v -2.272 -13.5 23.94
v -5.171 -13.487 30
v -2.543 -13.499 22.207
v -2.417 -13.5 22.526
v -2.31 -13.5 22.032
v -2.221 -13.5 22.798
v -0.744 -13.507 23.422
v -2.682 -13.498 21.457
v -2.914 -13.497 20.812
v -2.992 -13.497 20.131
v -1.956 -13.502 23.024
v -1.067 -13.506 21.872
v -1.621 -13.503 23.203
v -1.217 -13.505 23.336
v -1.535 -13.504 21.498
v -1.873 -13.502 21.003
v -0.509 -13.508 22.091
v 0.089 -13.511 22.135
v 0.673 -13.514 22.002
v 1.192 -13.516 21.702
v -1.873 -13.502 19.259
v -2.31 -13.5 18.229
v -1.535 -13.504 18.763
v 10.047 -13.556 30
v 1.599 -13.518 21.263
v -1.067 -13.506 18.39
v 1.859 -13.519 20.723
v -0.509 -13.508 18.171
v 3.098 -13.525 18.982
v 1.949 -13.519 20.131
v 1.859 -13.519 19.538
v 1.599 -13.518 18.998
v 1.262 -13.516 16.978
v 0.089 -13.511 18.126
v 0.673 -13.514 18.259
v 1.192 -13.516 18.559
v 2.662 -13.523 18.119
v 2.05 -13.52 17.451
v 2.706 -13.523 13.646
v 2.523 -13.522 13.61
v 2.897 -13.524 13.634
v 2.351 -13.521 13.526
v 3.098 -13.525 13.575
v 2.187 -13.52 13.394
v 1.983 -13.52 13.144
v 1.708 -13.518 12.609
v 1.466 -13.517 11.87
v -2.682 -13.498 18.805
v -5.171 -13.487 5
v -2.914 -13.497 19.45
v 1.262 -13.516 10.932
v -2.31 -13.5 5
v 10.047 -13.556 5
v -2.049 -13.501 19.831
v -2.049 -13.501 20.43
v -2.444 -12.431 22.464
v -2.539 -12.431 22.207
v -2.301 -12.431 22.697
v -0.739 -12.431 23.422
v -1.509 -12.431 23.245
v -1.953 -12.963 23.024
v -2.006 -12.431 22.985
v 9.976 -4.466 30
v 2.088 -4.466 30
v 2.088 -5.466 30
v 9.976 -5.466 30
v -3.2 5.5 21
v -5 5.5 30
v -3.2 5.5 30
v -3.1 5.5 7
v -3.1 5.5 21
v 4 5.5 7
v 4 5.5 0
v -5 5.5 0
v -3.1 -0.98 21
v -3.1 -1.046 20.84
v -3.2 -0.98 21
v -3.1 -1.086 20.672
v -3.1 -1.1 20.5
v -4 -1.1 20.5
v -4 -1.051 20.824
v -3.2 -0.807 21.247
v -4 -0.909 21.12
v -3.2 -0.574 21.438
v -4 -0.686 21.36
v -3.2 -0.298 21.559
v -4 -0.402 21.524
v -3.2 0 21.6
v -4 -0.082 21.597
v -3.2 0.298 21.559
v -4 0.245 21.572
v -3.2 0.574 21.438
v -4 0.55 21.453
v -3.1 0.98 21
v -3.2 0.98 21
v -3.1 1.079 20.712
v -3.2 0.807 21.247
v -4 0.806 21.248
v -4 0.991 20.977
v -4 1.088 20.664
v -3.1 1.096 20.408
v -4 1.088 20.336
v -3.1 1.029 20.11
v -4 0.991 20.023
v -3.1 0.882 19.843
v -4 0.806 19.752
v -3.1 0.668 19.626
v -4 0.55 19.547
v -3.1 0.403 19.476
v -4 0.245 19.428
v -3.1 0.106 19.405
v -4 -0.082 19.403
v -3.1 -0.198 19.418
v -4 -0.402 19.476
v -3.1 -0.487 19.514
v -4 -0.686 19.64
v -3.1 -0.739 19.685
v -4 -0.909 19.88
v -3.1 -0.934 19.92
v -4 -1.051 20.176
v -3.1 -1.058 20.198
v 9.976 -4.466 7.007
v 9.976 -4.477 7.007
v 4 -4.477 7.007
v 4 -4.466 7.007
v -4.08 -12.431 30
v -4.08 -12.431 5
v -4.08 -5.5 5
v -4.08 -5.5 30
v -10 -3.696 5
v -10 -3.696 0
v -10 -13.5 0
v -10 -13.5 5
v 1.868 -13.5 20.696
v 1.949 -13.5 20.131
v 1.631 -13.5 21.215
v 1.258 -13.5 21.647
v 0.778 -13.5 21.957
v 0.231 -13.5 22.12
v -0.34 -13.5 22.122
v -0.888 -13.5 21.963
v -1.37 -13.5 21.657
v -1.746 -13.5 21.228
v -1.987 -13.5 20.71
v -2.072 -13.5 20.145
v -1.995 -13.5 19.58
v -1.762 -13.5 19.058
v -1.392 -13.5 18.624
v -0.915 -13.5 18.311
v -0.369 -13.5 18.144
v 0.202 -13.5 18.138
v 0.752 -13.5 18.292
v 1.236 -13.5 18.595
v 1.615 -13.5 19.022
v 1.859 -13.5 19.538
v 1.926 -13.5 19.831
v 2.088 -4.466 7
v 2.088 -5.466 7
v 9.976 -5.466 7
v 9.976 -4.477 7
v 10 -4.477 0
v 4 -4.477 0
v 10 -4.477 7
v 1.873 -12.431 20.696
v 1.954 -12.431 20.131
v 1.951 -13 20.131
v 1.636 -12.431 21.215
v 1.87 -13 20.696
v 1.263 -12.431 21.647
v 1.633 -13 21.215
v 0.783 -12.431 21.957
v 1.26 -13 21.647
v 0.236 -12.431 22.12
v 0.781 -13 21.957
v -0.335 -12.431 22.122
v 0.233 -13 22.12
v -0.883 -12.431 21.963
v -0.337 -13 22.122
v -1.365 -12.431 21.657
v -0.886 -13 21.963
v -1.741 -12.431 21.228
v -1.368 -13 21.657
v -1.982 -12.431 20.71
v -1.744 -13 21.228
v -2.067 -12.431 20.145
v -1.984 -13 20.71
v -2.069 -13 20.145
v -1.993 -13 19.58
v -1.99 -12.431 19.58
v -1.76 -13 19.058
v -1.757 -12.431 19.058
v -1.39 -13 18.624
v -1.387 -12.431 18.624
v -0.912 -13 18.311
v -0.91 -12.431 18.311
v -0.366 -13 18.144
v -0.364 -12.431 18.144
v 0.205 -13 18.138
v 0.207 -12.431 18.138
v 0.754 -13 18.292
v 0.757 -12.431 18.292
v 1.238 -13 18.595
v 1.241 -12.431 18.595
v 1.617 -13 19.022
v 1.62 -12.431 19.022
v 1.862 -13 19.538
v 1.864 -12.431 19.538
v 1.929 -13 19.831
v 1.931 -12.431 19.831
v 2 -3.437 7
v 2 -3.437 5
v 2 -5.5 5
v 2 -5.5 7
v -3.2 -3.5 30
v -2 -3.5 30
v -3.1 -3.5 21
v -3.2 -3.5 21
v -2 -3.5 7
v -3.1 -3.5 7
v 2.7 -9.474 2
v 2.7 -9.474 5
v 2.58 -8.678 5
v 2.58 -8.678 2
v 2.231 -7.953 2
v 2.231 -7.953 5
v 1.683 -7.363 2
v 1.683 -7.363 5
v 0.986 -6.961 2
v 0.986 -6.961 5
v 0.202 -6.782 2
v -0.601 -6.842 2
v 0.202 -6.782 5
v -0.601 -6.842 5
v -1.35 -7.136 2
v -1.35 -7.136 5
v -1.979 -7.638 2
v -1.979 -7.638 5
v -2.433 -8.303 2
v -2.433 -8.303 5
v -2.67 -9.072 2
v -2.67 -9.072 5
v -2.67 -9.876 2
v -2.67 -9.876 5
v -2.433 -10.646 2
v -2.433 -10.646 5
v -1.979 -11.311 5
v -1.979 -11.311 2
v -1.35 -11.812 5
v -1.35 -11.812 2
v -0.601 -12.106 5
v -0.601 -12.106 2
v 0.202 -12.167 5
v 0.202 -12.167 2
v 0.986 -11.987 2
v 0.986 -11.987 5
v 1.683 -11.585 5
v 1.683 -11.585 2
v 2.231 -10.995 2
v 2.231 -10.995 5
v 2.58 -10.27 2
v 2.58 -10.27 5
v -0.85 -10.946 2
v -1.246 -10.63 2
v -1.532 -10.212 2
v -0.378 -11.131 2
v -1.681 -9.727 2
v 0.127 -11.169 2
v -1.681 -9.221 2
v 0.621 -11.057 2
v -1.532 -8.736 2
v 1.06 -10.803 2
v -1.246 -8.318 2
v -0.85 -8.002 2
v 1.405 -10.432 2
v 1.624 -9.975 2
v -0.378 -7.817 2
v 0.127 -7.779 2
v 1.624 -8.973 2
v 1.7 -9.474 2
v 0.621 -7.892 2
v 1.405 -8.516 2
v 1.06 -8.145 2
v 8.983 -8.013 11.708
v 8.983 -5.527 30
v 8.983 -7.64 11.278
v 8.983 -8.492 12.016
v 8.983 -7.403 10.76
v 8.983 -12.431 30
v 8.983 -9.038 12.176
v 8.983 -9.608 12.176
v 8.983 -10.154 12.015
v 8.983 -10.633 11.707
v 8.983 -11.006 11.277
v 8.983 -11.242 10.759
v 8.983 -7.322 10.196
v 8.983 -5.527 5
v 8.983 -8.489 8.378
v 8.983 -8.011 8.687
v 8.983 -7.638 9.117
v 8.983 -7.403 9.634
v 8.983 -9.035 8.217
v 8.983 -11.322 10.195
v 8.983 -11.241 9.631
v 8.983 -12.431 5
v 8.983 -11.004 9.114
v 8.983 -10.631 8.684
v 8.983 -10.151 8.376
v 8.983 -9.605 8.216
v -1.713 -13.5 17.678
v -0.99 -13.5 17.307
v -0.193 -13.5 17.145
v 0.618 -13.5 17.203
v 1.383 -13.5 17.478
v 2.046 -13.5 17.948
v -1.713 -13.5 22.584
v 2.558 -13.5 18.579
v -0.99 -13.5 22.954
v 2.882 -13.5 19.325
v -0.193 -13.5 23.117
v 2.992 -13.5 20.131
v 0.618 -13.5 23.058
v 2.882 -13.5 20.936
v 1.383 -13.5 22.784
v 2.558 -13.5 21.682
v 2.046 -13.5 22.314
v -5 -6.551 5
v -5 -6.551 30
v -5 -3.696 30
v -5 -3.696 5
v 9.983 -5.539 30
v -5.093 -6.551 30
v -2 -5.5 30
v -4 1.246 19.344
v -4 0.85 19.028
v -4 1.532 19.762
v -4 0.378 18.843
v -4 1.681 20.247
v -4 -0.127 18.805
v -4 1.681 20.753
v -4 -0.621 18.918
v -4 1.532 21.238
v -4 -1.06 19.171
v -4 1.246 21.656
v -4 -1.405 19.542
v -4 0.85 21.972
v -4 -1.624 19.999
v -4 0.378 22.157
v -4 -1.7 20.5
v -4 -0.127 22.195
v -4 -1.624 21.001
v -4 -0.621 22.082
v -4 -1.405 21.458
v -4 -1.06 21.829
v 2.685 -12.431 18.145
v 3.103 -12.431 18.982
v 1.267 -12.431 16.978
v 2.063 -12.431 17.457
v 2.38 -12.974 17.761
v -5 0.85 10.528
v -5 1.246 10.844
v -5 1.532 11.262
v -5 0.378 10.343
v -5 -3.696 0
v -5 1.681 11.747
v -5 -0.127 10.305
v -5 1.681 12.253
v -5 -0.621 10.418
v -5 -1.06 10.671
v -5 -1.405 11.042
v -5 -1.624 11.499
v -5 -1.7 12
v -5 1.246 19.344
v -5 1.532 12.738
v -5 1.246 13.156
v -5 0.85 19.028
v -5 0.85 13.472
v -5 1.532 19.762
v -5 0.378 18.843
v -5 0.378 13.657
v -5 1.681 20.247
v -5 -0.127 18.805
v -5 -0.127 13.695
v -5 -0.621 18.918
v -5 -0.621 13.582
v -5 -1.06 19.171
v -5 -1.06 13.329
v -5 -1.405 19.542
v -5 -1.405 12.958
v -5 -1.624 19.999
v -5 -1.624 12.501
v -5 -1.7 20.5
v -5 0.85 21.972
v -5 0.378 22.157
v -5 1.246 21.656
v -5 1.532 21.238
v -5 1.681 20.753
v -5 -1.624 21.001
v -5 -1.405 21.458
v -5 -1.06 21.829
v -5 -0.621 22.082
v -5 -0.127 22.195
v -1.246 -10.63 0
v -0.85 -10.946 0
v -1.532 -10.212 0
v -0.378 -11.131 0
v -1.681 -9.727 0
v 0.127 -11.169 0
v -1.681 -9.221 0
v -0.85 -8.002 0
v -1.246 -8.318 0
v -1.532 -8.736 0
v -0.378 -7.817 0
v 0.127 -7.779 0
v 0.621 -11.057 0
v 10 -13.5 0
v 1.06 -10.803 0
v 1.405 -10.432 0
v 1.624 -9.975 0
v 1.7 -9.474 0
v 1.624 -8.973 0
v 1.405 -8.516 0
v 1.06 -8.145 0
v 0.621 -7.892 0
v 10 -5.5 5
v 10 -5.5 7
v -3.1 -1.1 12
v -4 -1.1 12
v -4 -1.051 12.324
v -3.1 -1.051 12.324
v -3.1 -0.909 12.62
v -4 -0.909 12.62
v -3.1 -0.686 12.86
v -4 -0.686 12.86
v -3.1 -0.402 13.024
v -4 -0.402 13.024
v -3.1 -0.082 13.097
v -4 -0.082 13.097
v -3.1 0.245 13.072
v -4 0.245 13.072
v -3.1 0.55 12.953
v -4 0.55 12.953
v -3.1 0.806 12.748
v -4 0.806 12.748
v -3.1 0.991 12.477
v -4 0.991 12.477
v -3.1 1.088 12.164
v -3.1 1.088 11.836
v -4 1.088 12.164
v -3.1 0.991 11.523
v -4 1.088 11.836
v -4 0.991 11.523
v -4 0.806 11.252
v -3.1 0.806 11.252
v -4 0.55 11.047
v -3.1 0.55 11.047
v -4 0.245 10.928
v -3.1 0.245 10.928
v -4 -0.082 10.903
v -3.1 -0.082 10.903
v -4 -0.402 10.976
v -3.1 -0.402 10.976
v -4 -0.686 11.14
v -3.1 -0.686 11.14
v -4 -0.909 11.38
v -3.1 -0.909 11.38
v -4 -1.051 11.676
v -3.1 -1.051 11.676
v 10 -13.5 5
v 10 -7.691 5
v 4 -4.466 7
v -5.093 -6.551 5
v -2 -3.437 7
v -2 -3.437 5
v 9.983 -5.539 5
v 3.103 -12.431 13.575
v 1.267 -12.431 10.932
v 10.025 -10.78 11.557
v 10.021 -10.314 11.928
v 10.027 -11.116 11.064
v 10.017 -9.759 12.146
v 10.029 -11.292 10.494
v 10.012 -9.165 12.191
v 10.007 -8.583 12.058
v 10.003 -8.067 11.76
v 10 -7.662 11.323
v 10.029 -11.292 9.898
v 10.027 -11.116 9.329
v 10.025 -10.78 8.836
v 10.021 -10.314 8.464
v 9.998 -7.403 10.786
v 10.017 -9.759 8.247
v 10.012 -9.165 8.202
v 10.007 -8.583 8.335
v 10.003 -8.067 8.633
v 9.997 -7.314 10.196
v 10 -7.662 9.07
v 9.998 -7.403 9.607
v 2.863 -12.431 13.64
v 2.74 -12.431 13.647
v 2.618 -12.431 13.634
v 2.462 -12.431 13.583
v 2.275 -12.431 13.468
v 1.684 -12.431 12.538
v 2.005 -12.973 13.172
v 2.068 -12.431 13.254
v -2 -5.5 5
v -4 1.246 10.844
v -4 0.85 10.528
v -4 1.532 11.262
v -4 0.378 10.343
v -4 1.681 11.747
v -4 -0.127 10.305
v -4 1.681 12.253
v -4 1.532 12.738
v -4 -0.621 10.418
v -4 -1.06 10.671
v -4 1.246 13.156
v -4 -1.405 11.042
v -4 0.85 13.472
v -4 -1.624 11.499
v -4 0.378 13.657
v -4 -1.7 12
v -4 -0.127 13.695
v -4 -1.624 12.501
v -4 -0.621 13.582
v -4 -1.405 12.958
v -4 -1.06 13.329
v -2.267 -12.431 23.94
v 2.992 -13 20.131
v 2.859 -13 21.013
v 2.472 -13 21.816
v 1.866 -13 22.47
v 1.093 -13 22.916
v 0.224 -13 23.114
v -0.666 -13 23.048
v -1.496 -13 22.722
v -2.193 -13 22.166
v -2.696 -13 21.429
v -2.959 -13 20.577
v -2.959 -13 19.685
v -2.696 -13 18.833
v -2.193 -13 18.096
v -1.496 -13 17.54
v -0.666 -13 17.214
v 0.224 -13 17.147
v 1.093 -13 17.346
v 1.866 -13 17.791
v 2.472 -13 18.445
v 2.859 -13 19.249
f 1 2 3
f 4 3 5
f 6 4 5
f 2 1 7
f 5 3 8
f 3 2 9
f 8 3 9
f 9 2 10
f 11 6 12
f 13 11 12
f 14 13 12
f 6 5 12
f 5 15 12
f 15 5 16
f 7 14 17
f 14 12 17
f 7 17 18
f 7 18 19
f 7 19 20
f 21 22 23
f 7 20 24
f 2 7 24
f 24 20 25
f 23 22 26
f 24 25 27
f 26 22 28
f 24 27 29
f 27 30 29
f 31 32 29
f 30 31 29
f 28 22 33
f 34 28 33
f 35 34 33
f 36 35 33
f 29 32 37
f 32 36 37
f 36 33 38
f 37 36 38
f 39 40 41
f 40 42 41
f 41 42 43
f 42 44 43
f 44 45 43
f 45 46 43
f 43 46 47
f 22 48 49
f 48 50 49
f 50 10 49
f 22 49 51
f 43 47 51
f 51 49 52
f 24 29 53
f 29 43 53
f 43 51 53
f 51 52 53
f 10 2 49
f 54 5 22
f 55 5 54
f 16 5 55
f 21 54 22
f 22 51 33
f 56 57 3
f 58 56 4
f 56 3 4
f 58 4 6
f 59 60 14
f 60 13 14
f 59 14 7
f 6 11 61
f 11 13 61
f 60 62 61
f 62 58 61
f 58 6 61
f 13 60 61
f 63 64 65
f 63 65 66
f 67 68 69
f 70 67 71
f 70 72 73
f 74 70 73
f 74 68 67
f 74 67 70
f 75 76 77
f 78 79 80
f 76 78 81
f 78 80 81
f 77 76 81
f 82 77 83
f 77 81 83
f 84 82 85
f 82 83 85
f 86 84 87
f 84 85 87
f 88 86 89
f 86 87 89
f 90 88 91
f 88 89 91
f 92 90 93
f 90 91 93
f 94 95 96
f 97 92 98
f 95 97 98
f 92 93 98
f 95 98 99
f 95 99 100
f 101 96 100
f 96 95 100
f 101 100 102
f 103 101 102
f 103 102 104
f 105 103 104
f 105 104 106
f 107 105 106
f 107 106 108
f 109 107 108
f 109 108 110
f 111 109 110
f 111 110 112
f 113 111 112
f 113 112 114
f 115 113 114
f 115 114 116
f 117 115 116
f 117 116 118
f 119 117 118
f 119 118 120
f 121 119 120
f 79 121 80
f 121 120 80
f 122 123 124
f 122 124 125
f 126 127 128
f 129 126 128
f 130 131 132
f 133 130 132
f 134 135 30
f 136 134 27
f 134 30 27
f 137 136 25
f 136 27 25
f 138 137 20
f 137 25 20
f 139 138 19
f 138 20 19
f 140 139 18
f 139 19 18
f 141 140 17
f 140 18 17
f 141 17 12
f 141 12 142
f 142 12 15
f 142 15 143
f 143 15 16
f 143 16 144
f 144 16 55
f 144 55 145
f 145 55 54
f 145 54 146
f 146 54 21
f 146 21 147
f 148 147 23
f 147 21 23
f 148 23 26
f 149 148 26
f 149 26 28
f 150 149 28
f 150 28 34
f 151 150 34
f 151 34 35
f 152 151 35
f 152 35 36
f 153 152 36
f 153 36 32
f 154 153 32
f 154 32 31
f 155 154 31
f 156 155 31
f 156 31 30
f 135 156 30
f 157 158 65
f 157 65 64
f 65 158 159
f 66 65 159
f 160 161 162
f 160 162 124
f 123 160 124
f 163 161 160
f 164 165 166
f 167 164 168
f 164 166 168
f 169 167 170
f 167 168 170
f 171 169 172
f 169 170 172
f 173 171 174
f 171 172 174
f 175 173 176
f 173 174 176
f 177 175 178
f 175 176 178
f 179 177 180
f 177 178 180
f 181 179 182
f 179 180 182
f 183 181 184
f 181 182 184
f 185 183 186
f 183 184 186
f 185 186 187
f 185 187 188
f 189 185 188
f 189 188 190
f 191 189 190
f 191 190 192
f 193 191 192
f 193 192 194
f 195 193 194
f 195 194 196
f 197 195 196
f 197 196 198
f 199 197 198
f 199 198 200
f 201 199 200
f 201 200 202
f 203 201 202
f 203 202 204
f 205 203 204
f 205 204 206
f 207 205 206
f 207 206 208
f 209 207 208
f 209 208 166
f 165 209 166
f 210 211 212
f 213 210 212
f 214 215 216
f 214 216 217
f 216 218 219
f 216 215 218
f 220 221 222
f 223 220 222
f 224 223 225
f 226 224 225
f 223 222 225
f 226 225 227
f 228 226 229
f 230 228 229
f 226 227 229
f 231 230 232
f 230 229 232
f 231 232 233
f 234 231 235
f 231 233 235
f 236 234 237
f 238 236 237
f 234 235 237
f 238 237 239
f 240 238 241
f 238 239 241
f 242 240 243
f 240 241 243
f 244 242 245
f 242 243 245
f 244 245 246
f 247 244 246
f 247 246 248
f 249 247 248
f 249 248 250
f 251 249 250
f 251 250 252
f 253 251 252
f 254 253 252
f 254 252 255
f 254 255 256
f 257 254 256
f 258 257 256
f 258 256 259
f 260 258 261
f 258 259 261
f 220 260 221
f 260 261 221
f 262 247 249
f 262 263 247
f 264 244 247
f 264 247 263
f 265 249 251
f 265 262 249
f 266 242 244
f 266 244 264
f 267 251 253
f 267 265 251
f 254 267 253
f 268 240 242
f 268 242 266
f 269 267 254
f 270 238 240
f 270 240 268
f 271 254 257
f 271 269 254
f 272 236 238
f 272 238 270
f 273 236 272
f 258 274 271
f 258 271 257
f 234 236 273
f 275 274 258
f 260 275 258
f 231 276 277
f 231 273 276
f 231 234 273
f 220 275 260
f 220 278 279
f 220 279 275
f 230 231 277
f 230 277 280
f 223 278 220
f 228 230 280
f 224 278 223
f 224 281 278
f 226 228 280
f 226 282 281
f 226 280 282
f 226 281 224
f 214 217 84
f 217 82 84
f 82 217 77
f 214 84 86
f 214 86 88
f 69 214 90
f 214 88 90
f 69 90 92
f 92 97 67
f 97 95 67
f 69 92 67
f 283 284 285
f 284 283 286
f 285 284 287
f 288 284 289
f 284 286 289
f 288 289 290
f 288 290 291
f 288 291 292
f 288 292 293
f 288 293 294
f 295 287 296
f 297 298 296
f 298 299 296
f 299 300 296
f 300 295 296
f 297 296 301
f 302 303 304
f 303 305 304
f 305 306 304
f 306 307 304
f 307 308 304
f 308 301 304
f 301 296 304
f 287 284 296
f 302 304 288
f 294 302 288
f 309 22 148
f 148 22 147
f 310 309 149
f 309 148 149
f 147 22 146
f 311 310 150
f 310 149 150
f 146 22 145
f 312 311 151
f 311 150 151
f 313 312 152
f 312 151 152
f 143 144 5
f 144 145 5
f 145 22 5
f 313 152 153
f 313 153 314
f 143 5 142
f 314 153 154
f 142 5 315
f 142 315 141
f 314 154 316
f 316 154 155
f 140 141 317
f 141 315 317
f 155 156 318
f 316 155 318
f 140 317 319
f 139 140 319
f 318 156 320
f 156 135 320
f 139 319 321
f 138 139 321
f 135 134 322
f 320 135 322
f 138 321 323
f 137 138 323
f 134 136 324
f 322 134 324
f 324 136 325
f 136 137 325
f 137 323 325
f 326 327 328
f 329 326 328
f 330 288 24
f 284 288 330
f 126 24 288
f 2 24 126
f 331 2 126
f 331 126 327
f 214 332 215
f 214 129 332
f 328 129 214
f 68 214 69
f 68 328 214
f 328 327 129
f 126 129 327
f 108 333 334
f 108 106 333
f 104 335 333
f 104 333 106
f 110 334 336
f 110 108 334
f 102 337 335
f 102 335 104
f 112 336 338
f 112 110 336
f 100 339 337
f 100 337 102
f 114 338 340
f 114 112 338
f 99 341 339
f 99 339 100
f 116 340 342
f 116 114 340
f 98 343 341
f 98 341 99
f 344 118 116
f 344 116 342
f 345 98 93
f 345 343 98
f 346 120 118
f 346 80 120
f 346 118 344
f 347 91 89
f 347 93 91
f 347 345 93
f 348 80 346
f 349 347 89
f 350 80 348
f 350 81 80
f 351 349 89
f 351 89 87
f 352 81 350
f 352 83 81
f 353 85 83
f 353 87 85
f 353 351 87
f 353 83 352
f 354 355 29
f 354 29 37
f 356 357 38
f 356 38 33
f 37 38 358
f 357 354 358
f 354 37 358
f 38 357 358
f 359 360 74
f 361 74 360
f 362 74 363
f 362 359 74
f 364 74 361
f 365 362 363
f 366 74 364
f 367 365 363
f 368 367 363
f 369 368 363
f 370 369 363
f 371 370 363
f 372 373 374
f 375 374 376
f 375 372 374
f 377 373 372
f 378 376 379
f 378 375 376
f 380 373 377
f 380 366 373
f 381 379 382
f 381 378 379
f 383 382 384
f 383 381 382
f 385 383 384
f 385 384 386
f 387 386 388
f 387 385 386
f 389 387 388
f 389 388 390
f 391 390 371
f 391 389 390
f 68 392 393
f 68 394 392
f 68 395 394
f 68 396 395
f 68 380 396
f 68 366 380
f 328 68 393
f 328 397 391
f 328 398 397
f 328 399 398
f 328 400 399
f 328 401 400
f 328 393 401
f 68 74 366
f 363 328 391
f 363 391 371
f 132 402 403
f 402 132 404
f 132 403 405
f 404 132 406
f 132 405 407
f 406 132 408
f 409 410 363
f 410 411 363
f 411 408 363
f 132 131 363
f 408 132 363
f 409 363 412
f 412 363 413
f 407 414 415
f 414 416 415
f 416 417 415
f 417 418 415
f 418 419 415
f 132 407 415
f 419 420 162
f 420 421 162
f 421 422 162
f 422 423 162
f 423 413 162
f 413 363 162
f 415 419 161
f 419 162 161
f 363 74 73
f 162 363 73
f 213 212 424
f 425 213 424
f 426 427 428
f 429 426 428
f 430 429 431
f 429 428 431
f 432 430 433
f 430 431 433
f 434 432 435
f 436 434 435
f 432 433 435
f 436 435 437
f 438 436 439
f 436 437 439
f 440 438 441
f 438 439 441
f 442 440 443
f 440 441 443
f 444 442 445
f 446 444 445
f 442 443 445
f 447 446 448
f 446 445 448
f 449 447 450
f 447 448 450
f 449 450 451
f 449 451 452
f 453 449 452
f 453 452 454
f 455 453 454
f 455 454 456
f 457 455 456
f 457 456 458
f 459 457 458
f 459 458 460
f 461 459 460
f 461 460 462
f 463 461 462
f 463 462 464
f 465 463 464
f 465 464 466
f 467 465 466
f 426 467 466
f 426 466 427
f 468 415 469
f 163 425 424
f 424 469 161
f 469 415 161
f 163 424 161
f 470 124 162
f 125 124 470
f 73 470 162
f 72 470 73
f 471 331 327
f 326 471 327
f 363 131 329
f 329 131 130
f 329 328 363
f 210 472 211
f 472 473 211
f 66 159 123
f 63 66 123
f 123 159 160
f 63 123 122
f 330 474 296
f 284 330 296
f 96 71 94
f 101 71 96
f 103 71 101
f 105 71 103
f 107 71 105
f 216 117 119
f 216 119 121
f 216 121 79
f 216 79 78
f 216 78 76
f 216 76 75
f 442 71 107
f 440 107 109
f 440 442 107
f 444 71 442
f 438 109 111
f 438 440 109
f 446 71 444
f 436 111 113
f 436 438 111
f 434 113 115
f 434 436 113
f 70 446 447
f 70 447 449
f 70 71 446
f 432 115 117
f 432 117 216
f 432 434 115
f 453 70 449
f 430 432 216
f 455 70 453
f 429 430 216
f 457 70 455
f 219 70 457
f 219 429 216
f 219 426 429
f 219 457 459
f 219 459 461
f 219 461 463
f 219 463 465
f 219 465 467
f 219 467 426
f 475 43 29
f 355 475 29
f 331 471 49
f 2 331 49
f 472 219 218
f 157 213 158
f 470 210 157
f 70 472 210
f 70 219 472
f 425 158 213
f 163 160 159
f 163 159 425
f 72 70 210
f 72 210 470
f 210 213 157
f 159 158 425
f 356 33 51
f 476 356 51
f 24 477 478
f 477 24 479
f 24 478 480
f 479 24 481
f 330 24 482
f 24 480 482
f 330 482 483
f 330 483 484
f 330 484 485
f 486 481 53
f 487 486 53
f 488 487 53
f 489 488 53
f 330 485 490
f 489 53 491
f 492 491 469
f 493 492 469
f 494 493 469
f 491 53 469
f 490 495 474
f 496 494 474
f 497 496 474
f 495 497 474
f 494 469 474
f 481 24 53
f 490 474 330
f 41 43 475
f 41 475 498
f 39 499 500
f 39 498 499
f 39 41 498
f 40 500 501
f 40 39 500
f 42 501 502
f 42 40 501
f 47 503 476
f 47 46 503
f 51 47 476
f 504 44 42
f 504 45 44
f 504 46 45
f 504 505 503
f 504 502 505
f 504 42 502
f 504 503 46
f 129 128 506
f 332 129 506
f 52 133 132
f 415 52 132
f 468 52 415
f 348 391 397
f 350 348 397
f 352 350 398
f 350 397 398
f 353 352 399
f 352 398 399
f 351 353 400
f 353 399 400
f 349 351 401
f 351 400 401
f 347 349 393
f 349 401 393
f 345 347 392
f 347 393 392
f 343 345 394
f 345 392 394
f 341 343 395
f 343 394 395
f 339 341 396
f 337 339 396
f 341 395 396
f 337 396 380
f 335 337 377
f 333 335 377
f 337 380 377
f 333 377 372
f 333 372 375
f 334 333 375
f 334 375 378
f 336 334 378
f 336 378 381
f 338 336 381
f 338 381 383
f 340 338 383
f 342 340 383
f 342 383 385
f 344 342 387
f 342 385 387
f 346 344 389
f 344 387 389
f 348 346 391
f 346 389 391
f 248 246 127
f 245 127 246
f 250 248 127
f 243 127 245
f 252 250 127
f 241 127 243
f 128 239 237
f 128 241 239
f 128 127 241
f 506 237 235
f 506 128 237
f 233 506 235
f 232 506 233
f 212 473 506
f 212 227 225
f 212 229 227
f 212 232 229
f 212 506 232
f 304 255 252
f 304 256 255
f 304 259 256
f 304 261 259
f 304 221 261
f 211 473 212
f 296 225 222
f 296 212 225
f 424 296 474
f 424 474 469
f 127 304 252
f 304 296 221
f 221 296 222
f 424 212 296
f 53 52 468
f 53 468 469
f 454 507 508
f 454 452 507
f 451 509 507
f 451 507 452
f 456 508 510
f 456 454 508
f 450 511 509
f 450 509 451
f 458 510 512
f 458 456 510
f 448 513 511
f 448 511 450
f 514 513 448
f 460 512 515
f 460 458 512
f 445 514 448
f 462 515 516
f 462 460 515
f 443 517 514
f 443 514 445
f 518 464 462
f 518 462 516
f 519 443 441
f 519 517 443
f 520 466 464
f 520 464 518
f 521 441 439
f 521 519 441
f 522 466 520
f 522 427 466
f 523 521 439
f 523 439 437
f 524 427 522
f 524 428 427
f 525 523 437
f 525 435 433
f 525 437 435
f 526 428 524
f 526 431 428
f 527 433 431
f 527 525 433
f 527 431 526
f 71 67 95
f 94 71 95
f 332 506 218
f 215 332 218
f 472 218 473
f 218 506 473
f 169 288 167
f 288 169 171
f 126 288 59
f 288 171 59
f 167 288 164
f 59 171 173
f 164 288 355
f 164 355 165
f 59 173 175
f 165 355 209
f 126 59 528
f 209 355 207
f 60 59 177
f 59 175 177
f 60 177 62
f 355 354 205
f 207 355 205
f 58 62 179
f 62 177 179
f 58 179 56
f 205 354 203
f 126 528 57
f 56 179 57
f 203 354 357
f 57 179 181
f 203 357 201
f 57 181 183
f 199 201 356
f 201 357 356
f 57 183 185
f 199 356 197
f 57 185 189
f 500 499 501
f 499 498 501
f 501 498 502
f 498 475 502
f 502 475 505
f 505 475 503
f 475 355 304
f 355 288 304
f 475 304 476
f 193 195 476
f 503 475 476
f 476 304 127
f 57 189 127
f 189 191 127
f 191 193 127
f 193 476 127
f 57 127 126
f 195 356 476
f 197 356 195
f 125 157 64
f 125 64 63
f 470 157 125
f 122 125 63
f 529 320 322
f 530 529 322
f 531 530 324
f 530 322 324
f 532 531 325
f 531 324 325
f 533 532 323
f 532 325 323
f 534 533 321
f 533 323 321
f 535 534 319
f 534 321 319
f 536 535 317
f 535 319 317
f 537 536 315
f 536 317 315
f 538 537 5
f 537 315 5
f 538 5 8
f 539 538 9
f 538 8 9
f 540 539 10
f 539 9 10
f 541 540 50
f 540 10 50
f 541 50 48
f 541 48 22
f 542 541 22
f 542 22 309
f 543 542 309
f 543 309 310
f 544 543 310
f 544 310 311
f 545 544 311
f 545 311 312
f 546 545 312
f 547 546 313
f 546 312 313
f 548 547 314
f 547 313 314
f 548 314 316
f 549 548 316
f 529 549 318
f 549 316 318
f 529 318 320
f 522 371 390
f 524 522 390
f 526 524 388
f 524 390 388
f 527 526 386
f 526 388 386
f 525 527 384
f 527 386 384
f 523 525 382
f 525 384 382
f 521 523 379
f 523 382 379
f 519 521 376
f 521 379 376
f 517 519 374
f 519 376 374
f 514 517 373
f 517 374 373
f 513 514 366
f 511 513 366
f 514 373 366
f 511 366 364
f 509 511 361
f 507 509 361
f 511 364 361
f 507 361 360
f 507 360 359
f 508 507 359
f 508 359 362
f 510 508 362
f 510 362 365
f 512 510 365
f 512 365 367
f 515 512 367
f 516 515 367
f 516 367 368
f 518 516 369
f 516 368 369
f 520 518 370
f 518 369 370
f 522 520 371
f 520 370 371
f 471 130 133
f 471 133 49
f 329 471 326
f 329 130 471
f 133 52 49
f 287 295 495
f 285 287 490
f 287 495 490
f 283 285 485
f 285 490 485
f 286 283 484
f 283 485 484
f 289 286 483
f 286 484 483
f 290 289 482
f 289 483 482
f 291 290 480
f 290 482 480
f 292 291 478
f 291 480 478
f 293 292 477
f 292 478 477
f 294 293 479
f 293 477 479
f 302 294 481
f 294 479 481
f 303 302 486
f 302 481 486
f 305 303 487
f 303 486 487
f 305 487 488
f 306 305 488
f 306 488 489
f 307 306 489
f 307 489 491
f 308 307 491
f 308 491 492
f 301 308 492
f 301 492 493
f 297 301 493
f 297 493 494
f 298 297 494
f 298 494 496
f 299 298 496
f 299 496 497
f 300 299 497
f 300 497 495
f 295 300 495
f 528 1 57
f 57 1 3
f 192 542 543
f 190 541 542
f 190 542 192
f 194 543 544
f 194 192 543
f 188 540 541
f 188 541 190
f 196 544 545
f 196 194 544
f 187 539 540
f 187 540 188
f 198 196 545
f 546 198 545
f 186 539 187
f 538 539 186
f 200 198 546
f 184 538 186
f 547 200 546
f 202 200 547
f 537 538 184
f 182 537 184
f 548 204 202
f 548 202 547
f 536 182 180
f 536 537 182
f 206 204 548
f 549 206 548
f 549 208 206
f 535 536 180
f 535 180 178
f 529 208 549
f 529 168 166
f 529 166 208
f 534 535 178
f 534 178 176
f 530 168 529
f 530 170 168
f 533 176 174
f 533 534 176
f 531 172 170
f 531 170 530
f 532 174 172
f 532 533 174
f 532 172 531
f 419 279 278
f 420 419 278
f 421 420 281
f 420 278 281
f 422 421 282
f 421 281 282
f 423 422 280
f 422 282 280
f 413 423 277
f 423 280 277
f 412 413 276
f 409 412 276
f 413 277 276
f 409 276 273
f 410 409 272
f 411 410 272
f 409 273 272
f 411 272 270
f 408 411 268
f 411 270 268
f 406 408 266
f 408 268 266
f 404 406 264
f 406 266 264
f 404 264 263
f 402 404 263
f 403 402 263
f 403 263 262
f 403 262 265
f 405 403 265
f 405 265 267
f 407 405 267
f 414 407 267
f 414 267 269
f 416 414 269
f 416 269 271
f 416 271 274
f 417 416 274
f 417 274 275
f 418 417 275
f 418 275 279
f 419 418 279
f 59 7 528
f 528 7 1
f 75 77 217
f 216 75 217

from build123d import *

# Parameters (mm, degrees)
SKETCH_W           = 20
SKETCH_H           = 11
PAD_DEPTH          = 21
SKETCH001_W        = 20
SKETCH001_H        = 5
PAD001_DEPTH       = 8
SKETCH002_W        = 6.4
SKETCH002_H        = 9.70104
POCKET_DEPTH       = 16
SKETCH003_W        = 4
SKETCH003_H        = 2.091244
POCKET001_DEPTH    = 16
SKETCH005_R        = 2.7
POCKET002_DEPTH    = 3
SKETCH006_R        = 1.7
POCKET003_DEPTH    = 15
PAD002_DEPTH       = 1
PAD003_DEPTH       = 1
PAD004_DEPTH       = 8
PAD005_DEPTH       = 8
PAD006_DEPTH       = 1
PAD007_DEPTH       = 1
PAD007_FACE27_W    = 9
PAD007_FACE27_H    = 14
PAD008_DEPTH       = 0.1
PAD008_FACE24_W    = 9
PAD008_FACE24_H    = 14
PAD009_DEPTH       = 0.1
SKETCH009_W        = 11.765216
SKETCH009_H        = 12.105414
POCKET007_DEPTH    = 23
SKETCH010_W        = 8
SKETCH010_H        = 5
PAD010_DEPTH       = 6
PAD011_DEPTH       = 25
SKETCH012_W        = 7.888134
SKETCH012_H        = 1
PAD012_DEPTH       = 23
SKETCH014_R        = 2
POCKET008_DEPTH    = 5
SKETCH016_W        = 9.43169
SKETCH016_H        = 30.019524
POCKET010_DEPTH    = 5
SKETCH019_W        = 10.102889
SKETCH019_H        = 7.195522
POCKET012_DEPTH    = 6
SKETCH020_R        = 4.8264255923
POCKET014_DEPTH    = 0.5
POCKET015_DEPTH    = 2
COPYSKETCH024_R    = 1.1
POCKET017_DEPTH    = 3
SKETCH025_R        = 1.7
POCKET018_DEPTH    = 1
SKETCH026_R        = 2.010288662
POCKET019_DEPTH    = 5
COPYSKETCH027_R    = 2.99206
POCKET020_DEPTH    = 0.5
COPYSKETCH027001_W = 6.010766
COPYSKETCH027001_H = 4.360142
POCKET021_DEPTH    = 25


with BuildPart() as part:
    # Sketch → Pad (new body)
    with BuildSketch(Plane.XY):
        Rectangle(SKETCH_W, SKETCH_H)
    extrude(amount=PAD_DEPTH)

    # Sketch001 (on Face1 of Pad) → Pad001 (join)
    with BuildSketch(Plane.XZ.offset(5.5)):
        with Locations((0, 2.5)):
            Rectangle(SKETCH001_W, SKETCH001_H)
    extrude(amount=PAD001_DEPTH)

    # Sketch002 (on Face4 of Pad001) → Pocket (cut)
    with BuildSketch(Plane.XY.offset(21)):
        with Locations((0, 1.35052)):
            Rectangle(SKETCH002_W, SKETCH002_H)
    extrude(amount=-POCKET_DEPTH, mode=Mode.SUBTRACT)

    # Sketch003 (on Face4 of Pocket) → Pocket001 (cut)
    with BuildSketch(Plane.XY.offset(21)):
        with Locations((0, -4.482633)):
            Rectangle(SKETCH003_W, SKETCH003_H)
    extrude(amount=-POCKET001_DEPTH, mode=Mode.SUBTRACT)

    # Sketch005 (on Face5 of Pocket001) → Pocket002 (cut)
    with BuildSketch(Plane.XY.offset(5)):
        with Locations((0, -9.4740693718)):
            Circle(SKETCH005_R)
    extrude(amount=-POCKET002_DEPTH, mode=Mode.SUBTRACT)

    # Sketch006 (on Face24 of Pocket002) → Pocket003 (cut)
    with BuildSketch(Plane.XY.offset(2)):
        with Locations((0, -9.4740693718)):
            Circle(SKETCH006_R)
    extrude(amount=-POCKET003_DEPTH, mode=Mode.SUBTRACT)

    # Pocket003 Face21 → Pad002 (add)
    with BuildSketch(Plane(origin=(0, 1.0196321739, 5), x_dir=(0, 1, 0), z_dir=(0, 0, 1))):
        Polygon((4.4803678261, -3.2), (4.4803678261, 3.2), (-4.5196321739, 3.2), (-4.5196321739, 2), (-4.4566431739, 2), (-4.4566431739, -2), (-4.5196321739, -2), (-4.5196321739, -3.2), align=None)
    extrude(amount=PAD002_DEPTH)

    # Pad002 Face3 → Pad003 (add)
    with BuildSketch(Plane(origin=(6.4756476684, -0.1398963731, 21), x_dir=(0, 1, 0), z_dir=(0, 0, 1))):
        Polygon((-3.3601036269, 4.4756476684), (-5.3601036269, 4.4756476684), (-5.3601036269, -3.5243523316), (5.6398963731, -3.5243523316), (5.6398963731, 3.2756476684), (-3.3601036269, 3.2756476684), align=None)
    extrude(amount=PAD003_DEPTH)

    # Pad003 Face22 → Pad004 (add)
    with BuildSketch(Plane(origin=(-6.4756476684, -0.1398963731, 21), x_dir=(0, 1, 0), z_dir=(0, 0, 1))):
        Polygon((5.6398963731, -3.2756476684), (5.6398963731, 3.5243523316), (-5.3601036269, 3.5243523316), (-5.3601036269, -4.4756476684), (-3.3601036269, -4.4756476684), (-3.3601036269, -3.2756476684), align=None)
    extrude(amount=PAD004_DEPTH)

    # Pad004 Face11 → Pad005 (add)
    with BuildSketch(Plane(origin=(6.4756476684, -0.1398963731, 22), x_dir=(0, 1, 0), z_dir=(0, 0, 1))):
        Polygon((-3.3601036269, 4.4756476684), (-5.3601036269, 4.4756476684), (-5.3601036269, -3.5243523316), (5.6398963731, -3.5243523316), (5.6398963731, 3.2756476684), (-3.3601036269, 3.2756476684), align=None)
    extrude(amount=PAD005_DEPTH)

    # Pad005 Face40 → Pad006 (add)
    with BuildSketch(Plane(origin=(-6.4756476684, -0.1398963731, 29), x_dir=(0, 1, 0), z_dir=(0, 0, 1))):
        Polygon((5.6398963731, -3.2756476684), (5.6398963731, 3.5243523316), (-5.3601036269, 3.5243523316), (-5.3601036269, -4.4756476684), (-3.3601036269, -4.4756476684), (-3.3601036269, -3.2756476684), align=None)
    extrude(amount=PAD006_DEPTH)

    # Pad006 Face33 → Pad007 (add)
    with BuildSketch(Plane(origin=(0, 1.0196321739, 6), x_dir=(0, 1, 0), z_dir=(0, 0, 1))):
        Polygon((4.4803678261, -3.2), (4.4803678261, 3.2), (-4.5196321739, 3.2), (-4.5196321739, 2), (-4.4566431739, 2), (-4.4566431739, -2), (-4.5196321739, -2), (-4.5196321739, -3.2), align=None)
    extrude(amount=PAD007_DEPTH)

    # Pad007 Face27 → Pad008 (add)
    with BuildSketch(Plane(origin=(3.2, 1, 14), x_dir=(0, 1, 0), z_dir=(-1, 0, 0))):
        Rectangle(PAD007_FACE27_W, PAD007_FACE27_H)
    extrude(amount=PAD008_DEPTH)

    # Pad008 Face24 → Pad009 (add)
    with BuildSketch(Plane(origin=(-3.2, 1, 14), x_dir=(0, -1, 0), z_dir=(1, 0, 0))):
        Rectangle(PAD008_FACE24_W, PAD008_FACE24_H)
    extrude(amount=PAD009_DEPTH)

    # Sketch009 → Pocket007 (cut)
    with BuildSketch(Plane.XY.offset(30)):
        with Locations((7.044694, 0.235483)):
            Rectangle(SKETCH009_W, SKETCH009_H)
    extrude(amount=-POCKET007_DEPTH, mode=Mode.SUBTRACT)

    # Sketch010 → Pad010 (join)
    with BuildSketch(Plane(origin=(-4, 0, 0), x_dir=(0, -1, 0), z_dir=(-1, 0, 0))):
        with Locations((9.5, 2.5)):
            Rectangle(SKETCH010_W, SKETCH010_H)
    extrude(amount=PAD010_DEPTH)

    # Sketch011 (on Face16 of Pad010) → Pad011 (join)
    with BuildSketch(Plane.XY.offset(5)):
        Polygon((-5.0802496781, -5.4306888829), (-5.170571, -13.486972), (10.046902, -13.556283), (9.9827916781, -5.539257), (8.9827916781, -5.527363), (8.9827916781, -12.430687), (-4.0802496781, -12.430687), (-4.0802496781, -5.4306871171), align=None)
    extrude(amount=PAD011_DEPTH)

    # Sketch012 (on Face3 of Pad011) → Pad012 (join)
    with BuildSketch(Plane.XY.offset(7)):
        with Locations((6.031892, -4.9664883219)):
            Rectangle(SKETCH012_W, SKETCH012_H)
    extrude(amount=PAD012_DEPTH)

    # Sketch014 (on Face24 of Pad012) → Pocket008 (cut)
    with BuildSketch(Plane(origin=(9.9378599981, 0.0794707917, 0), x_dir=(-0.0079965154, 0.9999680274, 0), z_dir=(0.9999680274, 0.0079965154, 0))):
        with Locations((-9.393911, 10.196385)):
            Circle(SKETCH014_R)
    extrude(amount=-POCKET008_DEPTH, mode=Mode.SUBTRACT)

    # Sketch016 → Pocket010 (cut)
    with BuildSketch(Plane(origin=(-10, 0, 0), x_dir=(0, -1, 0), z_dir=(-1, 0, 0))):
        with Locations((-1.020089, 15.009762)):
            Rectangle(SKETCH016_W, SKETCH016_H)
    extrude(amount=-POCKET010_DEPTH, mode=Mode.SUBTRACT)

    # Sketch019 → Pocket012 (cut)
    with BuildSketch(Plane.YZ.offset(10)):
        with Locations((0.5744515, 3.409147)):
            Rectangle(SKETCH019_W, SKETCH019_H)
    extrude(amount=-POCKET012_DEPTH, mode=Mode.SUBTRACT)

    # Sketch020 → Pocket014 (cut)
    with BuildSketch(Plane.XY.offset(2)):
        with Locations((-0.021918, 17.928259)):
            Circle(SKETCH020_R)
    extrude(amount=-POCKET014_DEPTH, mode=Mode.SUBTRACT)

    # Sketch022 (on Face189 of Pocket014) → Pocket015 (cut)
    with BuildSketch(Plane.XY.offset(2)):
        with BuildLine():
            add(Edge.make_bspline(
                [(-1.975646, 22.546564), (-3.685938, 22.005808), (-4.331799, 20.570465)],
                knots=[0, 0, 0, 1, 1, 1], degree=2))
            Line((-4.331799, 20.570465), (-4.136705, 22.627766))
            Line((-4.136705, 22.627766), (-1.975646, 22.546564))
        make_face()
    extrude(amount=-POCKET015_DEPTH, mode=Mode.SUBTRACT)

    # CopySketch024 → Pocket017 (cut)
    with BuildSketch(Plane(origin=(-5, 0, 0), x_dir=(0, -1, 0), z_dir=(-1, 0, 0))):
        with Locations((0, 12)):
            Circle(COPYSKETCH024_R)
        with Locations((0, 20.5)):
            Circle(COPYSKETCH024_R)
    extrude(amount=-POCKET017_DEPTH, mode=Mode.SUBTRACT)

    # Sketch025 (on Face29 of Pocket017) → Pocket018 (cut)
    with BuildSketch(Plane(origin=(-5, 0, 0), x_dir=(0, -1, 0), z_dir=(-1, 0, 0))):
        with Locations((0, 20.5)):
            Circle(SKETCH025_R)
        with Locations((0, 12)):
            Circle(SKETCH025_R)
    extrude(amount=-POCKET018_DEPTH, mode=Mode.SUBTRACT)

    # Sketch026 (on Face48 of Pocket018) → Pocket019 (cut)
    with BuildSketch(Plane(origin=(-0.0615350782, -13.5102421178, 0), x_dir=(0.9999896275, -0.0045546512, 0), z_dir=(-0.0045546512, -0.9999896275, 0))):
        with Locations((0, 20.130779)):
            Circle(SKETCH026_R)
        with BuildLine():
            add(Edge.make_bspline(
                [(3.15934, 18.981977), (2.637434, 17.541506), (1.323444, 16.977846)],
                knots=[0, 0, 0, 1, 1, 1], degree=2))
            Line((1.323444, 16.977846), (1.323444, 10.931852))
            add(Edge.make_bspline(
                [(3.15934, 13.575), (1.886149, 14.090854), (1.323444, 10.931852)],
                knots=[0, 0, 0, 1, 1, 1], degree=2))
            Line((3.15934, 13.575), (3.15934, 18.981977))
        make_face()
        with BuildLine():
            add(Edge.make_bspline(
                [(-2.481979, 22.206863), (-2.206434, 23.233652), (-0.682459, 23.421541)],
                knots=[0, 0, 0, 1, 1, 1], degree=2))
            Line((-0.682459, 23.421541), (-2.210586, 23.939598))
            Line((-2.210586, 23.939598), (-2.481979, 22.206863))
        make_face()
    extrude(amount=-POCKET019_DEPTH, mode=Mode.SUBTRACT)

    # CopySketch027 → Pocket020 (cut)
    with BuildSketch(Plane.XZ.offset(13.5)):
        with Locations((0, 20.130779)):
            Circle(COPYSKETCH027_R)
    extrude(amount=-POCKET020_DEPTH, mode=Mode.SUBTRACT)

    # CopySketch027001 → Pocket021 (cut)
    with BuildSketch(Plane.XY.offset(30)):
        with Locations((-8.005399, -4.370609)):
            Rectangle(COPYSKETCH027001_W, COPYSKETCH027001_H)
    extrude(amount=-POCKET021_DEPTH, mode=Mode.SUBTRACT)


solid = part.part
